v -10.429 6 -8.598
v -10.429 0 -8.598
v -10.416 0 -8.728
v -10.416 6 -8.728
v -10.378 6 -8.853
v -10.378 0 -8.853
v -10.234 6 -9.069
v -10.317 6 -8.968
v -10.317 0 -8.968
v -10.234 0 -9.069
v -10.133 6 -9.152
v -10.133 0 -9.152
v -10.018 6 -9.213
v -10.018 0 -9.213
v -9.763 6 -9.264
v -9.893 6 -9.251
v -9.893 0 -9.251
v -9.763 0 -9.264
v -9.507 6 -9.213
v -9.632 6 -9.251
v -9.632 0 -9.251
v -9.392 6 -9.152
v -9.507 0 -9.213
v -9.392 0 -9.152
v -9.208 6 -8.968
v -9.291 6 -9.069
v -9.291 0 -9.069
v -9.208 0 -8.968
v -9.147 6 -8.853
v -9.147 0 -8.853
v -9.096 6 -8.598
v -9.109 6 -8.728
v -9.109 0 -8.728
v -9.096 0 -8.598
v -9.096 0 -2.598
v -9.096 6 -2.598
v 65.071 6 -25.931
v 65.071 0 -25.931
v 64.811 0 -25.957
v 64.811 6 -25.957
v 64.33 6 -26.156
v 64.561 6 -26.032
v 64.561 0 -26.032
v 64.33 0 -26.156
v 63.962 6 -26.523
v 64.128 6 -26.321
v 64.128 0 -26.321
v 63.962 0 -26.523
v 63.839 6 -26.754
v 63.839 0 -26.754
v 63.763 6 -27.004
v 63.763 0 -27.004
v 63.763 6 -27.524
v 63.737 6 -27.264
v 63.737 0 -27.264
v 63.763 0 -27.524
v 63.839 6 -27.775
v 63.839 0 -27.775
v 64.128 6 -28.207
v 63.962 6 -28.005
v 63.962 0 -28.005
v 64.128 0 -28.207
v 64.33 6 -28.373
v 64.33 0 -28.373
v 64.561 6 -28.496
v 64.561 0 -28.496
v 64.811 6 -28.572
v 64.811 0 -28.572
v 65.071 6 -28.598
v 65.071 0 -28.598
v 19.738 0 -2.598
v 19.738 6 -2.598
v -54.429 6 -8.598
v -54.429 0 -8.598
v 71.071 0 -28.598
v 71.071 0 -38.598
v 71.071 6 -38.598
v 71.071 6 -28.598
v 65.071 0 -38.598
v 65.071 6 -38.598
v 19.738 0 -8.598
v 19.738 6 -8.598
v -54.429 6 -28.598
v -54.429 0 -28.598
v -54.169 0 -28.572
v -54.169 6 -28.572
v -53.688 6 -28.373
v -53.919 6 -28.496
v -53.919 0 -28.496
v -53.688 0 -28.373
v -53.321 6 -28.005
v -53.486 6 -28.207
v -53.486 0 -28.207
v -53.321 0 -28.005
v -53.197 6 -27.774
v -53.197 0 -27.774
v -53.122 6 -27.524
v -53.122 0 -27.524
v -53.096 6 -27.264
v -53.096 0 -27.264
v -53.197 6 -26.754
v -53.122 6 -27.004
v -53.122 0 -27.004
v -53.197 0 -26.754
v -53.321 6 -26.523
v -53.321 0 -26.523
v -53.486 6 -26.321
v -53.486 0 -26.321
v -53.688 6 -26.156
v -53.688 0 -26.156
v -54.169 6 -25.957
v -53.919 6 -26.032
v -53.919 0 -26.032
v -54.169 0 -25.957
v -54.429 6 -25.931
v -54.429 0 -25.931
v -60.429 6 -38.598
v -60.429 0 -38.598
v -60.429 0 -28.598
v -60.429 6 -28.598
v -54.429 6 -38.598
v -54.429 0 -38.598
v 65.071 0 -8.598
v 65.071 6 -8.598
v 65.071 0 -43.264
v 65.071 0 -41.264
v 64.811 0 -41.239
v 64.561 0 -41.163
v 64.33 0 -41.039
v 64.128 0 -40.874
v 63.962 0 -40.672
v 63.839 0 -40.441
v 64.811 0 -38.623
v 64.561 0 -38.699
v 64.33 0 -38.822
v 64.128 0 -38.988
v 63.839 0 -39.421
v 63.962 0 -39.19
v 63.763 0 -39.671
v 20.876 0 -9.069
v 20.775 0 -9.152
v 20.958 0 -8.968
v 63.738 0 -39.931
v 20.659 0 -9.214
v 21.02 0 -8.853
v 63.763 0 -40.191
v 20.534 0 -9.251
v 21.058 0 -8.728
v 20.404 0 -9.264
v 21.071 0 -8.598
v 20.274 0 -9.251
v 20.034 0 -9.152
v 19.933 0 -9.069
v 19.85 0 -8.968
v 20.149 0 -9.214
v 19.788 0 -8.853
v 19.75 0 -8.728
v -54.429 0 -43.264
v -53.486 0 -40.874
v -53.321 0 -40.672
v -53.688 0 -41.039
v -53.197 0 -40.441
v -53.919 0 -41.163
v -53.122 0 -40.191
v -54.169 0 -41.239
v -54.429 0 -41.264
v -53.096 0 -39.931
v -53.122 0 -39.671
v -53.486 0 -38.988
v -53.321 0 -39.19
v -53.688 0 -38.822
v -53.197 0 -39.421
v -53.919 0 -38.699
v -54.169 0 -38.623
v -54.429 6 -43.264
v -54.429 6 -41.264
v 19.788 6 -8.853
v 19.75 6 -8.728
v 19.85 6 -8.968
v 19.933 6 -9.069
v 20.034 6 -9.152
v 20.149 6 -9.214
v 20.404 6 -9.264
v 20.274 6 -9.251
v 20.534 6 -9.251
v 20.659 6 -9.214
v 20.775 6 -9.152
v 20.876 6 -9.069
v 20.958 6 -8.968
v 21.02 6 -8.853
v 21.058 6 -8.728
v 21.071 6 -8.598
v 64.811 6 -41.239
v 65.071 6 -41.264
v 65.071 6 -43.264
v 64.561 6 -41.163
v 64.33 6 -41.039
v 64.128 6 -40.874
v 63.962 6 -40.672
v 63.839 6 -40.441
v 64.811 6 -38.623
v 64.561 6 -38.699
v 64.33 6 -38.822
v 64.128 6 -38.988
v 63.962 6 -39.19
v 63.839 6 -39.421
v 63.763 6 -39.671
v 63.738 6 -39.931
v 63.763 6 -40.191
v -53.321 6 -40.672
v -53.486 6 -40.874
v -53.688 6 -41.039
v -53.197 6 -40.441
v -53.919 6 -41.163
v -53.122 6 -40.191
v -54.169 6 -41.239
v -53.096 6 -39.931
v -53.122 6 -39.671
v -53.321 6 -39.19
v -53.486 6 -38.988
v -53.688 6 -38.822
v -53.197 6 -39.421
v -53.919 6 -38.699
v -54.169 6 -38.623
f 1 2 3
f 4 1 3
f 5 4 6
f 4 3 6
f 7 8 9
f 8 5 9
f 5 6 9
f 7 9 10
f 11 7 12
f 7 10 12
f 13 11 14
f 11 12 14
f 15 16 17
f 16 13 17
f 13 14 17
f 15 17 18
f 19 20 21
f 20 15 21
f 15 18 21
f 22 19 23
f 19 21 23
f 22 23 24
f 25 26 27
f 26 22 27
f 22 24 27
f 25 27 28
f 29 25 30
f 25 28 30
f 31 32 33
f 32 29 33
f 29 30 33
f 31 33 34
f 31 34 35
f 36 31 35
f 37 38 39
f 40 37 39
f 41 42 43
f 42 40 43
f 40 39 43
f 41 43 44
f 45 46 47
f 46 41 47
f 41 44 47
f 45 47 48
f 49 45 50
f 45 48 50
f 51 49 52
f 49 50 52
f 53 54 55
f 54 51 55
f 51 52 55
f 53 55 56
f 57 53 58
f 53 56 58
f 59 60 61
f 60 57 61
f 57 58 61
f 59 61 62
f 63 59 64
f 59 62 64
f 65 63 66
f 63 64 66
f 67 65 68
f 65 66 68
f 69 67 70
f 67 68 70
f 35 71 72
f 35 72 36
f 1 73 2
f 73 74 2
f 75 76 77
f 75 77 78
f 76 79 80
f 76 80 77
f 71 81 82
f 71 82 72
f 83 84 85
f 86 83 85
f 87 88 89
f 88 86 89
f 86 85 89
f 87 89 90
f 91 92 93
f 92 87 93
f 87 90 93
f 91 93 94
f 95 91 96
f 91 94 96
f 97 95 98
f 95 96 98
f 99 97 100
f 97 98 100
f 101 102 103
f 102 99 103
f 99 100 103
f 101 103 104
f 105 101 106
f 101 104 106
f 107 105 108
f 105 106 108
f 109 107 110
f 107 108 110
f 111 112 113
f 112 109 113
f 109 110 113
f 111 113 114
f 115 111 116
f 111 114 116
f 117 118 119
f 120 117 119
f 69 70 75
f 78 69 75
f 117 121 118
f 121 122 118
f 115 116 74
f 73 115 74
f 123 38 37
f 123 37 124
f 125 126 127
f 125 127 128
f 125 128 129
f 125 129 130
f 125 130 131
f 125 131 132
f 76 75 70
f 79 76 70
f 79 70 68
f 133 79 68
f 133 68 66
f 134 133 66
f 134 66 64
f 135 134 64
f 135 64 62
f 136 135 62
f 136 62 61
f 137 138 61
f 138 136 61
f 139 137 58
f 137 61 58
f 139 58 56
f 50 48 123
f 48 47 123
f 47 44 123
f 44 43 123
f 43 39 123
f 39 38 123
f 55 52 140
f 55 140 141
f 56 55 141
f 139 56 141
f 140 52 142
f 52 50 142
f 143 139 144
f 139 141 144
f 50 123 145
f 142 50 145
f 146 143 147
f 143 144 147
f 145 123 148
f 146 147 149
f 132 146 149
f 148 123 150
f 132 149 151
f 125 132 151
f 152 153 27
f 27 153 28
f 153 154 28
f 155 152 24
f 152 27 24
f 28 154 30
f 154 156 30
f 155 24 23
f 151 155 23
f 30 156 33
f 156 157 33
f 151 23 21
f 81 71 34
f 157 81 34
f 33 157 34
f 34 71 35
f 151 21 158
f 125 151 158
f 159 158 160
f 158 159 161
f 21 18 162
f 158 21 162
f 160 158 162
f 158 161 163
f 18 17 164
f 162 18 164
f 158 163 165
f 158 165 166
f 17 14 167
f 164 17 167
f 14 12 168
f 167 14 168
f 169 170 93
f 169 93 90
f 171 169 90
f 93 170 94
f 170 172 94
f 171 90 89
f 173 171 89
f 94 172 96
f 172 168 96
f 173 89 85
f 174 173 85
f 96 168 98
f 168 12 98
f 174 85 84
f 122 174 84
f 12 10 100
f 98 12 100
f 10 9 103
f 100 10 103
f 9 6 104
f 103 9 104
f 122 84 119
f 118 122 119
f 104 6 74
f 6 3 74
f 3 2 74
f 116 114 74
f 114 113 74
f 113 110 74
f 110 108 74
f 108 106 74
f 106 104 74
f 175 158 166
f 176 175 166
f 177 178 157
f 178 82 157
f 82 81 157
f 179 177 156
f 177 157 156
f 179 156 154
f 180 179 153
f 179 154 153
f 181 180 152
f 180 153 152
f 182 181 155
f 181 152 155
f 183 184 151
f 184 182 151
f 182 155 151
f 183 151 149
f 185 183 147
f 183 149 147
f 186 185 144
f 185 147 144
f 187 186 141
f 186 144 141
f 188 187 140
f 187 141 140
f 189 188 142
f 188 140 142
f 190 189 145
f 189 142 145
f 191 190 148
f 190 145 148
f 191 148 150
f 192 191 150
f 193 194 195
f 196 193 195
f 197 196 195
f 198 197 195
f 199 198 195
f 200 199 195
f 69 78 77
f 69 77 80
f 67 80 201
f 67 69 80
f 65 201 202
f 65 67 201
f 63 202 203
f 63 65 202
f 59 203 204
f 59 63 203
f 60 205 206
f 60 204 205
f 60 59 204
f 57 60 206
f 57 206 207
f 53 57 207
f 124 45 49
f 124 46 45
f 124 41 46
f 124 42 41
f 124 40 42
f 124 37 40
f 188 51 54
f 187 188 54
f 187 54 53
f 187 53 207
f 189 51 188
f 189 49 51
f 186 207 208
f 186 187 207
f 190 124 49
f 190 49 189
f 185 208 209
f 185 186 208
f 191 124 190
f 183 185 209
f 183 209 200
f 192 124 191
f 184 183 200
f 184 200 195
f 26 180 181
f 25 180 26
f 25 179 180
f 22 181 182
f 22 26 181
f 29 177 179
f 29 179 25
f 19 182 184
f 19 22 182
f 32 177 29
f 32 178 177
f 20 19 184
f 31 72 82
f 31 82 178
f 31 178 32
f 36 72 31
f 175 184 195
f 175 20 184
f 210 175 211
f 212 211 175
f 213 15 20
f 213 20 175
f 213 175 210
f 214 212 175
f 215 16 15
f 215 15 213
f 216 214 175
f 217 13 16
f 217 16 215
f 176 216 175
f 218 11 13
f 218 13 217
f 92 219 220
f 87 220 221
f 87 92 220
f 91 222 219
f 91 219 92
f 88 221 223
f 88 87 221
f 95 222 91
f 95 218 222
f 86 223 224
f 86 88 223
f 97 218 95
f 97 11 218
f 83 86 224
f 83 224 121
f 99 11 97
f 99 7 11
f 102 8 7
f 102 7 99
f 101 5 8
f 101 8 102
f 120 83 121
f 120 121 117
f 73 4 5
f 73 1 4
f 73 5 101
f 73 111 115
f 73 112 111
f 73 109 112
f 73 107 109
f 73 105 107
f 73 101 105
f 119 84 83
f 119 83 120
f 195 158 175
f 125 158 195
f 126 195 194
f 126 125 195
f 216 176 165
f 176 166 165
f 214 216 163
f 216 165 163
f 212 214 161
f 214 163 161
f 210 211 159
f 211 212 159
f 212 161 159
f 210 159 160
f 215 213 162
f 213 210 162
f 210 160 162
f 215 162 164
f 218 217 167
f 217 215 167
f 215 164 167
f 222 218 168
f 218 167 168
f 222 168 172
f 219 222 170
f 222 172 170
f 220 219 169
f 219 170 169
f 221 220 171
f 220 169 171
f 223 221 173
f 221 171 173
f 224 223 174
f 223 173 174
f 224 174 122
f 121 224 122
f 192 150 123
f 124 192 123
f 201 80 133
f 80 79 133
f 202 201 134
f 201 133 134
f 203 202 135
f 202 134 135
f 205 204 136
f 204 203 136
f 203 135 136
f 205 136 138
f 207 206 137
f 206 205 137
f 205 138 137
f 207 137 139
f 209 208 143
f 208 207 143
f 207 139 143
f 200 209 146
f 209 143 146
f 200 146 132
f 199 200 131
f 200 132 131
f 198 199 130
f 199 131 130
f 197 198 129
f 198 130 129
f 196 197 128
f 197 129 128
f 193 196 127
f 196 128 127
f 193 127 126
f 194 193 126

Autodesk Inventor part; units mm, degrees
ref_plane "YZ Plane" through (0, 0, 0) normal (1, 0, 0) x (0, 1, 0)
ref_plane "XZ Plane" through (0, 0, 0) normal (0, 1, 0) x (-1, 0, 0)
ref_plane "XY Plane" through (0, 0, 0) normal (0, 0, 1) x (1, 0, 0)
sketch "Sketch1" plane through (0, 0, 0) normal (0, 1, 0) x (-1, 0, 0)
  line L0 (54.4292, -43.2642) -> (54.4292, -41.2642)
  arc A0 (54.4292, -38.5976) -> (54.4292, -41.2642) centre (54.4292, -39.9309) ccw
  arc A1 (54.4292, -25.9309) -> (54.4292, -28.5976) centre (54.4292, -27.2642) ccw
  line L1 (54.4292, -25.9309) -> (54.4292, -8.5976)
  line L2 (54.4292, -28.5976) -> (60.4292, -28.5976)
  line L3 (54.4292, -38.5976) -> (60.4292, -38.5976)
  line L4 (60.4292, -38.5976) -> (60.4292, -28.5976)
  line L5 (54.4292, -43.2642) -> (-65.0708, -43.2642)
  line L6 (-65.0708, -43.2642) -> (-65.0708, -41.2642)
  arc A2 (-65.0708, -41.2642) -> (-65.0708, -38.5976) centre (-65.0708, -39.9309) ccw
  arc A3 (-65.0708, -28.5976) -> (-65.0708, -25.9309) centre (-65.0708, -27.2642) ccw
  line L7 (-65.0708, -25.9309) -> (-65.0708, -8.5976)
  line L8 (-65.0708, -28.5976) -> (-71.0708, -28.5976)
  line L9 (-65.0708, -38.5976) -> (-71.0708, -38.5976)
  line L10 (-71.0708, -38.5976) -> (-71.0708, -28.5976)
  arc A4 (9.0959, -8.5976) -> (10.4292, -8.5976) centre (9.7625, -8.5976) ccw
  arc A5 (-21.0708, -8.5976) -> (-19.7375, -8.5976) centre (-20.4041, -8.5976) ccw
  line L11 (-21.0708, -8.5976) -> (-65.0708, -8.5976)
  line L12 (54.4292, -8.5976) -> (10.4292, -8.5976)
  line L13 (-19.7375, -2.5976) -> (9.0959, -2.5976)
  line L14 (-19.7375, -8.5976) -> (-19.7375, -2.5976)
  line L15 (9.0959, -8.5976) -> (9.0959, -2.5976)
  point P0 (0, 0)
  dimension "d1" = 2
  dimension "d2" = 2.6667
  dimension "d5" = 2.6667
  dimension "d6" = 17.3333
  dimension "d9" = 6
  dimension "d10" = 119.5
  dimension "d11" = 10
  dimension "d15" = 1.3333
  dimension "d16" = 1.3333
  dimension "d18" = 44
  dimension "d19" = 44
  dimension "d21" = 20
  dimension "d23" = 6
extrude "Extrusion1" add sketch "Sketch1" along normal blind 6
properties part number "Support A Cross" material "Wood (Maple)"
